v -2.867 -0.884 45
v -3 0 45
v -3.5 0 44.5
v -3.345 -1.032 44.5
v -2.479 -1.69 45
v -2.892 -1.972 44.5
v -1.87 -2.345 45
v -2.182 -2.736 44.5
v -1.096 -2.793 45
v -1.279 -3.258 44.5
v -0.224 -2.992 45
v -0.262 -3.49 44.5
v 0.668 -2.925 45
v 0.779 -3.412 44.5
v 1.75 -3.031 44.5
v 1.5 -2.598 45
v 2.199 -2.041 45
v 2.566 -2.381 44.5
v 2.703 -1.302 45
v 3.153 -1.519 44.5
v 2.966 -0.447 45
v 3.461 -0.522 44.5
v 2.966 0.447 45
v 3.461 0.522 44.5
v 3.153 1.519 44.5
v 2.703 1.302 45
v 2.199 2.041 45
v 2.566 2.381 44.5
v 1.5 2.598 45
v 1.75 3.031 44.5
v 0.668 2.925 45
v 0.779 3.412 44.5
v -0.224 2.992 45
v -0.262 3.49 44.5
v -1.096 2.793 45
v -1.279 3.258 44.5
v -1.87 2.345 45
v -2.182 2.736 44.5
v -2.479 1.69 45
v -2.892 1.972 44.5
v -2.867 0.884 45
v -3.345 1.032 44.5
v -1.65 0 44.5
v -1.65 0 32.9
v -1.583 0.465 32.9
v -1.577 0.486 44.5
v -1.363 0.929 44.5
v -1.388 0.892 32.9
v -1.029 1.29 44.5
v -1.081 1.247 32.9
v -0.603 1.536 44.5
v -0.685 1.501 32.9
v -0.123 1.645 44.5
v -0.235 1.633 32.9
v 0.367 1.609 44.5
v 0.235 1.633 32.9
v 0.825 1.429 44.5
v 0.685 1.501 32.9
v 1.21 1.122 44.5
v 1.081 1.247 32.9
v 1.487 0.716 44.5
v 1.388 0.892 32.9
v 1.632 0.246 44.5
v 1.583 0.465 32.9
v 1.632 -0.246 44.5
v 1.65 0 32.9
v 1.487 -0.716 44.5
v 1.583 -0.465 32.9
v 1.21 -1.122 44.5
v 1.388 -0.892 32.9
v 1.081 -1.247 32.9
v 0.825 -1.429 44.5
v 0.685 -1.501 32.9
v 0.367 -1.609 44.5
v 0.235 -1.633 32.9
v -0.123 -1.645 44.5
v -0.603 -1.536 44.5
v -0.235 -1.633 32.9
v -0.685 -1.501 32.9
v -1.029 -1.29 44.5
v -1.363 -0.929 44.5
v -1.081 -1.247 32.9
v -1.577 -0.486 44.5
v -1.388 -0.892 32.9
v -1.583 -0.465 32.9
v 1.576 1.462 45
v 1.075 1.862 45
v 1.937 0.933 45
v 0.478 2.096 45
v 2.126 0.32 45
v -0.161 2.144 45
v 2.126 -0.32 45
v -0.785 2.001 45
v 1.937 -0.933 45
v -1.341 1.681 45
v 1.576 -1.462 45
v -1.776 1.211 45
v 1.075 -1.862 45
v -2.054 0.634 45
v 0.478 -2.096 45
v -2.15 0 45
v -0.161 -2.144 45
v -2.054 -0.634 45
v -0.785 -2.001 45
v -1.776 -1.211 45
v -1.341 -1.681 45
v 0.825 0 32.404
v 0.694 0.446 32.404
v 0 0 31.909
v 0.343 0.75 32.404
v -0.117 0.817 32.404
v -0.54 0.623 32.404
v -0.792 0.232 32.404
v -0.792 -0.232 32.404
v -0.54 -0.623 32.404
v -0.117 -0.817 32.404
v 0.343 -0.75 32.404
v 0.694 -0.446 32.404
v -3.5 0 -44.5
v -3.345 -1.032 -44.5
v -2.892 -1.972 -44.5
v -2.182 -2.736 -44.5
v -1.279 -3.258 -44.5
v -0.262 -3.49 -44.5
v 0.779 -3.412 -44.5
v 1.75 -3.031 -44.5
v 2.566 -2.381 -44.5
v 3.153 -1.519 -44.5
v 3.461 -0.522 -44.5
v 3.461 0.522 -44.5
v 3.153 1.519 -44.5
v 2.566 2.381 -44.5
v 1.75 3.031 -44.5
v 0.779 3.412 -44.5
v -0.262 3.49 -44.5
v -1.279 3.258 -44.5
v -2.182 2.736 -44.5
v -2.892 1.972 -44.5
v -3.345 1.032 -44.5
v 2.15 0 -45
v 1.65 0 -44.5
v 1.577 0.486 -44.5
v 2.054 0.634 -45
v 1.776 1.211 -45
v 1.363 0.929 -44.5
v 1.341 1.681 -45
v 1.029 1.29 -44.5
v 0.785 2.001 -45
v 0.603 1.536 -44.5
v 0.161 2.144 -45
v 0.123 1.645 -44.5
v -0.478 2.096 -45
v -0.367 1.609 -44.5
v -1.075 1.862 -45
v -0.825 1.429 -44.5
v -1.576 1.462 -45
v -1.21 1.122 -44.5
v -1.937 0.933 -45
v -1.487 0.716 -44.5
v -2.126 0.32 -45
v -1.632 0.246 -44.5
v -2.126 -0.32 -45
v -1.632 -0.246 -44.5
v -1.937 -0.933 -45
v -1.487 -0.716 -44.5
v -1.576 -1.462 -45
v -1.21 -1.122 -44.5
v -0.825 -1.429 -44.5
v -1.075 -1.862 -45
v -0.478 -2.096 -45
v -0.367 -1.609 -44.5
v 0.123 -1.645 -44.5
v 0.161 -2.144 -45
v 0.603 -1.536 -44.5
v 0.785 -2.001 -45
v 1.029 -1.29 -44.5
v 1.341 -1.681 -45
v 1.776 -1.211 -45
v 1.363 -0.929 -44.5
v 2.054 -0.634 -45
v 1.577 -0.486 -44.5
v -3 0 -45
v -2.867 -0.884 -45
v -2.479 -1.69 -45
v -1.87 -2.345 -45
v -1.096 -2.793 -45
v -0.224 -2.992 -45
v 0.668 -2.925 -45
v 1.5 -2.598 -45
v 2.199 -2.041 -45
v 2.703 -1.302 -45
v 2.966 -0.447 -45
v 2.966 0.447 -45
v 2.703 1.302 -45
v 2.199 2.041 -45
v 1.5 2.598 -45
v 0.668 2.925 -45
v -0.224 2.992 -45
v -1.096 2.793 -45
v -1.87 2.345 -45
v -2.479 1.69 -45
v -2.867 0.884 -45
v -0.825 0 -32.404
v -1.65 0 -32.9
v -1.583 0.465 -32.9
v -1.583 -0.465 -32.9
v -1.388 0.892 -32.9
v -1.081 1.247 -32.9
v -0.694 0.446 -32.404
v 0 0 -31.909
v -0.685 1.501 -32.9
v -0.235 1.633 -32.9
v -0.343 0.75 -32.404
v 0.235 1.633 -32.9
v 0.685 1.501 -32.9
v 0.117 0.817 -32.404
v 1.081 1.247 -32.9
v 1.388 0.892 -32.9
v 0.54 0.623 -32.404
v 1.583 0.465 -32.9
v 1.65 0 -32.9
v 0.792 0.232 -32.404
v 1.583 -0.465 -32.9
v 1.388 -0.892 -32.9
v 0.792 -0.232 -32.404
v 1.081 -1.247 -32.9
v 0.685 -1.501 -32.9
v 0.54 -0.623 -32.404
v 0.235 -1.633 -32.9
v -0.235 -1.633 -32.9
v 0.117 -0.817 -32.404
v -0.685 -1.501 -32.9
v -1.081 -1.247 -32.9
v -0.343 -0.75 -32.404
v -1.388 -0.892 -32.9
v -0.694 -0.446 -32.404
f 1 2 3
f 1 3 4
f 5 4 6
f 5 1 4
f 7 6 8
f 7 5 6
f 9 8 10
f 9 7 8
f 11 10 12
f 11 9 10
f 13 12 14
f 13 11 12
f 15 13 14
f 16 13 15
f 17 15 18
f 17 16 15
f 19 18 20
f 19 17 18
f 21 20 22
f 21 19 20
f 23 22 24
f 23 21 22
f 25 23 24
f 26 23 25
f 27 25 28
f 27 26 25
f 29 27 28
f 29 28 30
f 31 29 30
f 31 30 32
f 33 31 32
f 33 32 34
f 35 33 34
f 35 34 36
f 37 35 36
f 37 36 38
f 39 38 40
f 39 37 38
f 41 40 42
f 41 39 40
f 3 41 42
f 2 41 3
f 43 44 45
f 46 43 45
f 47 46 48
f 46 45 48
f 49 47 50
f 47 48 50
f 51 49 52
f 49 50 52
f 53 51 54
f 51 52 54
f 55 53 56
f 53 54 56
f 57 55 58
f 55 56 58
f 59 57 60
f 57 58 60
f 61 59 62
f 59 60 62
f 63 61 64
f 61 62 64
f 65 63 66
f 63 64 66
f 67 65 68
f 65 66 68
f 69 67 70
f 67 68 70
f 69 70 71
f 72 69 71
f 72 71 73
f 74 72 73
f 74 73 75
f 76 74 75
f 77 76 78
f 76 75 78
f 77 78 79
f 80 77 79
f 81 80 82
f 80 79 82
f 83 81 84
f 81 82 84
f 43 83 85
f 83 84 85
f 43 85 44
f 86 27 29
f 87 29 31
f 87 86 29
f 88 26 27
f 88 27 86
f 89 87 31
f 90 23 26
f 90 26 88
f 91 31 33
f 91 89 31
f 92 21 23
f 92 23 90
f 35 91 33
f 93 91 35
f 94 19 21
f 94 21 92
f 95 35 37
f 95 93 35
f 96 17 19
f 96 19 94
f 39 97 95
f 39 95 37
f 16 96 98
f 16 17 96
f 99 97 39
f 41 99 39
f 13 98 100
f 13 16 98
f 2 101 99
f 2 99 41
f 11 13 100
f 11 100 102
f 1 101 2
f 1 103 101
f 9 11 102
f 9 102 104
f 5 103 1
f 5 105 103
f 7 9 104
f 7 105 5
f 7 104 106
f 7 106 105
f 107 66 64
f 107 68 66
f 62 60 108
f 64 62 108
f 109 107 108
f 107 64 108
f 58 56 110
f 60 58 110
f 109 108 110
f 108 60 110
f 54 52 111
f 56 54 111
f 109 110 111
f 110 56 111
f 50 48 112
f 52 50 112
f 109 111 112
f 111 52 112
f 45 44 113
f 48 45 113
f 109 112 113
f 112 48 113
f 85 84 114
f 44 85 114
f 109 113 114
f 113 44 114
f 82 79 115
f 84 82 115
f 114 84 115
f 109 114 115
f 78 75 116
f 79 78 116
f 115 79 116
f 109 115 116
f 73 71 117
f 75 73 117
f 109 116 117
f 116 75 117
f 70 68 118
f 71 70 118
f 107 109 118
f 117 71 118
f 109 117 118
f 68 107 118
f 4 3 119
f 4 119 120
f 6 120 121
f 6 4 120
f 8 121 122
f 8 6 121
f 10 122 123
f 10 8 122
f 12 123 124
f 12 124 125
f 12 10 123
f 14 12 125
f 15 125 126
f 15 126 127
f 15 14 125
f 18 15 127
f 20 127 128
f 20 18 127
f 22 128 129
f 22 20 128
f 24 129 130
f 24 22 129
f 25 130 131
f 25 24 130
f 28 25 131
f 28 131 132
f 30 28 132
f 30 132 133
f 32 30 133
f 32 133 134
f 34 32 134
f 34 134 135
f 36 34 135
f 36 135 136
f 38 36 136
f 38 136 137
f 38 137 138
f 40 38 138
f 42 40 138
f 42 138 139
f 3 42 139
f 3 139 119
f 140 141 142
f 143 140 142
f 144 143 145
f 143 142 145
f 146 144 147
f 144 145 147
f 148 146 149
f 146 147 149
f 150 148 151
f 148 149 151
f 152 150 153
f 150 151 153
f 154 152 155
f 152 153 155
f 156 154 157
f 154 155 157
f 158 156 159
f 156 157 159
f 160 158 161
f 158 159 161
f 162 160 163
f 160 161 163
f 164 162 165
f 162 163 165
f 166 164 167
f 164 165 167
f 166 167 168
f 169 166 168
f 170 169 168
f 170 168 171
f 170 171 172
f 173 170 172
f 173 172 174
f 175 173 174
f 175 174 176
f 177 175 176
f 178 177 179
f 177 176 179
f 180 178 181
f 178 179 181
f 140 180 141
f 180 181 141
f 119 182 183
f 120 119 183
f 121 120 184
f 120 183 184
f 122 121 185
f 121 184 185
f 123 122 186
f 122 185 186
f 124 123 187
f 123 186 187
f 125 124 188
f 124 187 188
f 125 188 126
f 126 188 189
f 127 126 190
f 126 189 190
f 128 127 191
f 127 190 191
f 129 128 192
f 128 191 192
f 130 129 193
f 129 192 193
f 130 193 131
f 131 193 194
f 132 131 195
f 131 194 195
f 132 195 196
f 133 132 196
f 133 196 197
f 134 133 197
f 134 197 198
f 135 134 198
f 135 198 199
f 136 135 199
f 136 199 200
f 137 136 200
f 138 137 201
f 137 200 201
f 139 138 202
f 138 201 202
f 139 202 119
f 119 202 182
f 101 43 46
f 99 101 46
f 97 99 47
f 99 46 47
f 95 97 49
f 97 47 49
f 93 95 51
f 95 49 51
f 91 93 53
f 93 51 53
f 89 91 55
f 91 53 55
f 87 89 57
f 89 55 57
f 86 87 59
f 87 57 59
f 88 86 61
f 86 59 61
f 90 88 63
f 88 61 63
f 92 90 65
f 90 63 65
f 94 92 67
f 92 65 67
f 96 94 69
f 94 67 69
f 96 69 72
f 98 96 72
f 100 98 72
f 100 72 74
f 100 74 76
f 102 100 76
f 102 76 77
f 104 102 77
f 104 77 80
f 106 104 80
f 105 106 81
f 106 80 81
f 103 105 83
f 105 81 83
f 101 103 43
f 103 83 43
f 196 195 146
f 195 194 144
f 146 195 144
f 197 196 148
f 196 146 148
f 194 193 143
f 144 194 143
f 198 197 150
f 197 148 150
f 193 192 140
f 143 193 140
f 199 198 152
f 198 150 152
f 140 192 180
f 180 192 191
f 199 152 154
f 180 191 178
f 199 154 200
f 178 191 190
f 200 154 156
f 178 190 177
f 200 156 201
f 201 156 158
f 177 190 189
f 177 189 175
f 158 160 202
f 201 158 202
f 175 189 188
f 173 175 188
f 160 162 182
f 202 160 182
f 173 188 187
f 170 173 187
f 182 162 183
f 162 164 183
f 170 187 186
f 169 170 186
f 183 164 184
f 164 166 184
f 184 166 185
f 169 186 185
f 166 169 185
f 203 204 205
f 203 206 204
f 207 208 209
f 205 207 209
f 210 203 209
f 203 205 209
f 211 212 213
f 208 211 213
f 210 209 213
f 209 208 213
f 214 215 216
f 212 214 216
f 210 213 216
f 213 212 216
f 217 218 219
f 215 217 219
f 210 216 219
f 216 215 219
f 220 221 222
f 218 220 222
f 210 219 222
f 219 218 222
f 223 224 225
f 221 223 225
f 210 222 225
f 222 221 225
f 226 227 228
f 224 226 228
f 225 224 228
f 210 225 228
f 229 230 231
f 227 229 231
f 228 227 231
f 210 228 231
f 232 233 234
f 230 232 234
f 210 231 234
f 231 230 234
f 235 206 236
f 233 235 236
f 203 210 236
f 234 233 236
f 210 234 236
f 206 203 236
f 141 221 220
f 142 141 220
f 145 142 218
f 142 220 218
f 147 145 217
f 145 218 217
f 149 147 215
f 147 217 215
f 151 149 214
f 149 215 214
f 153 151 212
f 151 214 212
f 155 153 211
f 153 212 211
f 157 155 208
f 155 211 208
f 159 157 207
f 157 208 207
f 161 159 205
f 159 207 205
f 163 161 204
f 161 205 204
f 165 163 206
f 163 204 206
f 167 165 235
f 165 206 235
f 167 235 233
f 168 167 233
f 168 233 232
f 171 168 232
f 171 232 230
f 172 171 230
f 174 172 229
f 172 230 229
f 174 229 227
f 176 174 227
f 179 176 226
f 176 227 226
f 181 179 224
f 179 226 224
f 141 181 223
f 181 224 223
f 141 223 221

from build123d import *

# Parameters (mm, degrees)
SKETCH_1_R                       = 3.5
EXTRUDE_1_DEPTH                  = 45
HOLE_WIZARD_M4_1_D               = 3.3
HOLE_WIZARD_M4_1_DEPTH           = 12.1
HOLE_WIZARD_M4_1_TIP             = 0.991420021
HOLE_WIZARD_M4_1_ON_FACE_2_D     = 3.3
HOLE_WIZARD_M4_1_ON_FACE_2_DEPTH = 12.1
HOLE_WIZARD_M4_1_ON_FACE_2_TIP   = 0.991420021
CHAMFER_1_SIZE                   = 0.5


with BuildPart() as part:
    # 草图1 → 拉伸1 (new, symmetric)
    with BuildSketch(Plane.XY):
        with Locations(Location((0, 0, 0), (0, 0, 180))):
            Circle(SKETCH_1_R)
    extrude(amount=EXTRUDE_1_DEPTH, both=True)

    # M4 螺纹孔1
    with Locations(Plane.XY.offset(45)):
        with Locations((0, 0)):
            Hole(HOLE_WIZARD_M4_1_D / 2, depth=HOLE_WIZARD_M4_1_DEPTH)
            with Locations((0, 0, -(HOLE_WIZARD_M4_1_DEPTH + HOLE_WIZARD_M4_1_TIP / 2))):  # 118° drill point
                Cone(0, HOLE_WIZARD_M4_1_D / 2, HOLE_WIZARD_M4_1_TIP, mode=Mode.SUBTRACT)

    # M4 螺纹孔1 on face 2
    with Locations(Plane(origin=(0, 0, -45), x_dir=(-1, 0, 0), z_dir=(0, 0, -1))):
        with Locations((0, 0)):
            Hole(HOLE_WIZARD_M4_1_ON_FACE_2_D / 2, depth=HOLE_WIZARD_M4_1_ON_FACE_2_DEPTH)
            with Locations((0, 0, -(HOLE_WIZARD_M4_1_ON_FACE_2_DEPTH + HOLE_WIZARD_M4_1_ON_FACE_2_TIP / 2))):  # 118° drill point
                Cone(0, HOLE_WIZARD_M4_1_ON_FACE_2_D / 2, HOLE_WIZARD_M4_1_ON_FACE_2_TIP, mode=Mode.SUBTRACT)

    # 倒角1
    chamfer_1_edges = [part.edges().sort_by_distance(p)[0] for p in [
        (3.5, 0, -45),
        (3.5, 0, 45),
        (-1.65, 0, -45),
        (1.65, 0, 45),
    ]]
    chamfer(chamfer_1_edges, length=CHAMFER_1_SIZE)


solid = part.part
